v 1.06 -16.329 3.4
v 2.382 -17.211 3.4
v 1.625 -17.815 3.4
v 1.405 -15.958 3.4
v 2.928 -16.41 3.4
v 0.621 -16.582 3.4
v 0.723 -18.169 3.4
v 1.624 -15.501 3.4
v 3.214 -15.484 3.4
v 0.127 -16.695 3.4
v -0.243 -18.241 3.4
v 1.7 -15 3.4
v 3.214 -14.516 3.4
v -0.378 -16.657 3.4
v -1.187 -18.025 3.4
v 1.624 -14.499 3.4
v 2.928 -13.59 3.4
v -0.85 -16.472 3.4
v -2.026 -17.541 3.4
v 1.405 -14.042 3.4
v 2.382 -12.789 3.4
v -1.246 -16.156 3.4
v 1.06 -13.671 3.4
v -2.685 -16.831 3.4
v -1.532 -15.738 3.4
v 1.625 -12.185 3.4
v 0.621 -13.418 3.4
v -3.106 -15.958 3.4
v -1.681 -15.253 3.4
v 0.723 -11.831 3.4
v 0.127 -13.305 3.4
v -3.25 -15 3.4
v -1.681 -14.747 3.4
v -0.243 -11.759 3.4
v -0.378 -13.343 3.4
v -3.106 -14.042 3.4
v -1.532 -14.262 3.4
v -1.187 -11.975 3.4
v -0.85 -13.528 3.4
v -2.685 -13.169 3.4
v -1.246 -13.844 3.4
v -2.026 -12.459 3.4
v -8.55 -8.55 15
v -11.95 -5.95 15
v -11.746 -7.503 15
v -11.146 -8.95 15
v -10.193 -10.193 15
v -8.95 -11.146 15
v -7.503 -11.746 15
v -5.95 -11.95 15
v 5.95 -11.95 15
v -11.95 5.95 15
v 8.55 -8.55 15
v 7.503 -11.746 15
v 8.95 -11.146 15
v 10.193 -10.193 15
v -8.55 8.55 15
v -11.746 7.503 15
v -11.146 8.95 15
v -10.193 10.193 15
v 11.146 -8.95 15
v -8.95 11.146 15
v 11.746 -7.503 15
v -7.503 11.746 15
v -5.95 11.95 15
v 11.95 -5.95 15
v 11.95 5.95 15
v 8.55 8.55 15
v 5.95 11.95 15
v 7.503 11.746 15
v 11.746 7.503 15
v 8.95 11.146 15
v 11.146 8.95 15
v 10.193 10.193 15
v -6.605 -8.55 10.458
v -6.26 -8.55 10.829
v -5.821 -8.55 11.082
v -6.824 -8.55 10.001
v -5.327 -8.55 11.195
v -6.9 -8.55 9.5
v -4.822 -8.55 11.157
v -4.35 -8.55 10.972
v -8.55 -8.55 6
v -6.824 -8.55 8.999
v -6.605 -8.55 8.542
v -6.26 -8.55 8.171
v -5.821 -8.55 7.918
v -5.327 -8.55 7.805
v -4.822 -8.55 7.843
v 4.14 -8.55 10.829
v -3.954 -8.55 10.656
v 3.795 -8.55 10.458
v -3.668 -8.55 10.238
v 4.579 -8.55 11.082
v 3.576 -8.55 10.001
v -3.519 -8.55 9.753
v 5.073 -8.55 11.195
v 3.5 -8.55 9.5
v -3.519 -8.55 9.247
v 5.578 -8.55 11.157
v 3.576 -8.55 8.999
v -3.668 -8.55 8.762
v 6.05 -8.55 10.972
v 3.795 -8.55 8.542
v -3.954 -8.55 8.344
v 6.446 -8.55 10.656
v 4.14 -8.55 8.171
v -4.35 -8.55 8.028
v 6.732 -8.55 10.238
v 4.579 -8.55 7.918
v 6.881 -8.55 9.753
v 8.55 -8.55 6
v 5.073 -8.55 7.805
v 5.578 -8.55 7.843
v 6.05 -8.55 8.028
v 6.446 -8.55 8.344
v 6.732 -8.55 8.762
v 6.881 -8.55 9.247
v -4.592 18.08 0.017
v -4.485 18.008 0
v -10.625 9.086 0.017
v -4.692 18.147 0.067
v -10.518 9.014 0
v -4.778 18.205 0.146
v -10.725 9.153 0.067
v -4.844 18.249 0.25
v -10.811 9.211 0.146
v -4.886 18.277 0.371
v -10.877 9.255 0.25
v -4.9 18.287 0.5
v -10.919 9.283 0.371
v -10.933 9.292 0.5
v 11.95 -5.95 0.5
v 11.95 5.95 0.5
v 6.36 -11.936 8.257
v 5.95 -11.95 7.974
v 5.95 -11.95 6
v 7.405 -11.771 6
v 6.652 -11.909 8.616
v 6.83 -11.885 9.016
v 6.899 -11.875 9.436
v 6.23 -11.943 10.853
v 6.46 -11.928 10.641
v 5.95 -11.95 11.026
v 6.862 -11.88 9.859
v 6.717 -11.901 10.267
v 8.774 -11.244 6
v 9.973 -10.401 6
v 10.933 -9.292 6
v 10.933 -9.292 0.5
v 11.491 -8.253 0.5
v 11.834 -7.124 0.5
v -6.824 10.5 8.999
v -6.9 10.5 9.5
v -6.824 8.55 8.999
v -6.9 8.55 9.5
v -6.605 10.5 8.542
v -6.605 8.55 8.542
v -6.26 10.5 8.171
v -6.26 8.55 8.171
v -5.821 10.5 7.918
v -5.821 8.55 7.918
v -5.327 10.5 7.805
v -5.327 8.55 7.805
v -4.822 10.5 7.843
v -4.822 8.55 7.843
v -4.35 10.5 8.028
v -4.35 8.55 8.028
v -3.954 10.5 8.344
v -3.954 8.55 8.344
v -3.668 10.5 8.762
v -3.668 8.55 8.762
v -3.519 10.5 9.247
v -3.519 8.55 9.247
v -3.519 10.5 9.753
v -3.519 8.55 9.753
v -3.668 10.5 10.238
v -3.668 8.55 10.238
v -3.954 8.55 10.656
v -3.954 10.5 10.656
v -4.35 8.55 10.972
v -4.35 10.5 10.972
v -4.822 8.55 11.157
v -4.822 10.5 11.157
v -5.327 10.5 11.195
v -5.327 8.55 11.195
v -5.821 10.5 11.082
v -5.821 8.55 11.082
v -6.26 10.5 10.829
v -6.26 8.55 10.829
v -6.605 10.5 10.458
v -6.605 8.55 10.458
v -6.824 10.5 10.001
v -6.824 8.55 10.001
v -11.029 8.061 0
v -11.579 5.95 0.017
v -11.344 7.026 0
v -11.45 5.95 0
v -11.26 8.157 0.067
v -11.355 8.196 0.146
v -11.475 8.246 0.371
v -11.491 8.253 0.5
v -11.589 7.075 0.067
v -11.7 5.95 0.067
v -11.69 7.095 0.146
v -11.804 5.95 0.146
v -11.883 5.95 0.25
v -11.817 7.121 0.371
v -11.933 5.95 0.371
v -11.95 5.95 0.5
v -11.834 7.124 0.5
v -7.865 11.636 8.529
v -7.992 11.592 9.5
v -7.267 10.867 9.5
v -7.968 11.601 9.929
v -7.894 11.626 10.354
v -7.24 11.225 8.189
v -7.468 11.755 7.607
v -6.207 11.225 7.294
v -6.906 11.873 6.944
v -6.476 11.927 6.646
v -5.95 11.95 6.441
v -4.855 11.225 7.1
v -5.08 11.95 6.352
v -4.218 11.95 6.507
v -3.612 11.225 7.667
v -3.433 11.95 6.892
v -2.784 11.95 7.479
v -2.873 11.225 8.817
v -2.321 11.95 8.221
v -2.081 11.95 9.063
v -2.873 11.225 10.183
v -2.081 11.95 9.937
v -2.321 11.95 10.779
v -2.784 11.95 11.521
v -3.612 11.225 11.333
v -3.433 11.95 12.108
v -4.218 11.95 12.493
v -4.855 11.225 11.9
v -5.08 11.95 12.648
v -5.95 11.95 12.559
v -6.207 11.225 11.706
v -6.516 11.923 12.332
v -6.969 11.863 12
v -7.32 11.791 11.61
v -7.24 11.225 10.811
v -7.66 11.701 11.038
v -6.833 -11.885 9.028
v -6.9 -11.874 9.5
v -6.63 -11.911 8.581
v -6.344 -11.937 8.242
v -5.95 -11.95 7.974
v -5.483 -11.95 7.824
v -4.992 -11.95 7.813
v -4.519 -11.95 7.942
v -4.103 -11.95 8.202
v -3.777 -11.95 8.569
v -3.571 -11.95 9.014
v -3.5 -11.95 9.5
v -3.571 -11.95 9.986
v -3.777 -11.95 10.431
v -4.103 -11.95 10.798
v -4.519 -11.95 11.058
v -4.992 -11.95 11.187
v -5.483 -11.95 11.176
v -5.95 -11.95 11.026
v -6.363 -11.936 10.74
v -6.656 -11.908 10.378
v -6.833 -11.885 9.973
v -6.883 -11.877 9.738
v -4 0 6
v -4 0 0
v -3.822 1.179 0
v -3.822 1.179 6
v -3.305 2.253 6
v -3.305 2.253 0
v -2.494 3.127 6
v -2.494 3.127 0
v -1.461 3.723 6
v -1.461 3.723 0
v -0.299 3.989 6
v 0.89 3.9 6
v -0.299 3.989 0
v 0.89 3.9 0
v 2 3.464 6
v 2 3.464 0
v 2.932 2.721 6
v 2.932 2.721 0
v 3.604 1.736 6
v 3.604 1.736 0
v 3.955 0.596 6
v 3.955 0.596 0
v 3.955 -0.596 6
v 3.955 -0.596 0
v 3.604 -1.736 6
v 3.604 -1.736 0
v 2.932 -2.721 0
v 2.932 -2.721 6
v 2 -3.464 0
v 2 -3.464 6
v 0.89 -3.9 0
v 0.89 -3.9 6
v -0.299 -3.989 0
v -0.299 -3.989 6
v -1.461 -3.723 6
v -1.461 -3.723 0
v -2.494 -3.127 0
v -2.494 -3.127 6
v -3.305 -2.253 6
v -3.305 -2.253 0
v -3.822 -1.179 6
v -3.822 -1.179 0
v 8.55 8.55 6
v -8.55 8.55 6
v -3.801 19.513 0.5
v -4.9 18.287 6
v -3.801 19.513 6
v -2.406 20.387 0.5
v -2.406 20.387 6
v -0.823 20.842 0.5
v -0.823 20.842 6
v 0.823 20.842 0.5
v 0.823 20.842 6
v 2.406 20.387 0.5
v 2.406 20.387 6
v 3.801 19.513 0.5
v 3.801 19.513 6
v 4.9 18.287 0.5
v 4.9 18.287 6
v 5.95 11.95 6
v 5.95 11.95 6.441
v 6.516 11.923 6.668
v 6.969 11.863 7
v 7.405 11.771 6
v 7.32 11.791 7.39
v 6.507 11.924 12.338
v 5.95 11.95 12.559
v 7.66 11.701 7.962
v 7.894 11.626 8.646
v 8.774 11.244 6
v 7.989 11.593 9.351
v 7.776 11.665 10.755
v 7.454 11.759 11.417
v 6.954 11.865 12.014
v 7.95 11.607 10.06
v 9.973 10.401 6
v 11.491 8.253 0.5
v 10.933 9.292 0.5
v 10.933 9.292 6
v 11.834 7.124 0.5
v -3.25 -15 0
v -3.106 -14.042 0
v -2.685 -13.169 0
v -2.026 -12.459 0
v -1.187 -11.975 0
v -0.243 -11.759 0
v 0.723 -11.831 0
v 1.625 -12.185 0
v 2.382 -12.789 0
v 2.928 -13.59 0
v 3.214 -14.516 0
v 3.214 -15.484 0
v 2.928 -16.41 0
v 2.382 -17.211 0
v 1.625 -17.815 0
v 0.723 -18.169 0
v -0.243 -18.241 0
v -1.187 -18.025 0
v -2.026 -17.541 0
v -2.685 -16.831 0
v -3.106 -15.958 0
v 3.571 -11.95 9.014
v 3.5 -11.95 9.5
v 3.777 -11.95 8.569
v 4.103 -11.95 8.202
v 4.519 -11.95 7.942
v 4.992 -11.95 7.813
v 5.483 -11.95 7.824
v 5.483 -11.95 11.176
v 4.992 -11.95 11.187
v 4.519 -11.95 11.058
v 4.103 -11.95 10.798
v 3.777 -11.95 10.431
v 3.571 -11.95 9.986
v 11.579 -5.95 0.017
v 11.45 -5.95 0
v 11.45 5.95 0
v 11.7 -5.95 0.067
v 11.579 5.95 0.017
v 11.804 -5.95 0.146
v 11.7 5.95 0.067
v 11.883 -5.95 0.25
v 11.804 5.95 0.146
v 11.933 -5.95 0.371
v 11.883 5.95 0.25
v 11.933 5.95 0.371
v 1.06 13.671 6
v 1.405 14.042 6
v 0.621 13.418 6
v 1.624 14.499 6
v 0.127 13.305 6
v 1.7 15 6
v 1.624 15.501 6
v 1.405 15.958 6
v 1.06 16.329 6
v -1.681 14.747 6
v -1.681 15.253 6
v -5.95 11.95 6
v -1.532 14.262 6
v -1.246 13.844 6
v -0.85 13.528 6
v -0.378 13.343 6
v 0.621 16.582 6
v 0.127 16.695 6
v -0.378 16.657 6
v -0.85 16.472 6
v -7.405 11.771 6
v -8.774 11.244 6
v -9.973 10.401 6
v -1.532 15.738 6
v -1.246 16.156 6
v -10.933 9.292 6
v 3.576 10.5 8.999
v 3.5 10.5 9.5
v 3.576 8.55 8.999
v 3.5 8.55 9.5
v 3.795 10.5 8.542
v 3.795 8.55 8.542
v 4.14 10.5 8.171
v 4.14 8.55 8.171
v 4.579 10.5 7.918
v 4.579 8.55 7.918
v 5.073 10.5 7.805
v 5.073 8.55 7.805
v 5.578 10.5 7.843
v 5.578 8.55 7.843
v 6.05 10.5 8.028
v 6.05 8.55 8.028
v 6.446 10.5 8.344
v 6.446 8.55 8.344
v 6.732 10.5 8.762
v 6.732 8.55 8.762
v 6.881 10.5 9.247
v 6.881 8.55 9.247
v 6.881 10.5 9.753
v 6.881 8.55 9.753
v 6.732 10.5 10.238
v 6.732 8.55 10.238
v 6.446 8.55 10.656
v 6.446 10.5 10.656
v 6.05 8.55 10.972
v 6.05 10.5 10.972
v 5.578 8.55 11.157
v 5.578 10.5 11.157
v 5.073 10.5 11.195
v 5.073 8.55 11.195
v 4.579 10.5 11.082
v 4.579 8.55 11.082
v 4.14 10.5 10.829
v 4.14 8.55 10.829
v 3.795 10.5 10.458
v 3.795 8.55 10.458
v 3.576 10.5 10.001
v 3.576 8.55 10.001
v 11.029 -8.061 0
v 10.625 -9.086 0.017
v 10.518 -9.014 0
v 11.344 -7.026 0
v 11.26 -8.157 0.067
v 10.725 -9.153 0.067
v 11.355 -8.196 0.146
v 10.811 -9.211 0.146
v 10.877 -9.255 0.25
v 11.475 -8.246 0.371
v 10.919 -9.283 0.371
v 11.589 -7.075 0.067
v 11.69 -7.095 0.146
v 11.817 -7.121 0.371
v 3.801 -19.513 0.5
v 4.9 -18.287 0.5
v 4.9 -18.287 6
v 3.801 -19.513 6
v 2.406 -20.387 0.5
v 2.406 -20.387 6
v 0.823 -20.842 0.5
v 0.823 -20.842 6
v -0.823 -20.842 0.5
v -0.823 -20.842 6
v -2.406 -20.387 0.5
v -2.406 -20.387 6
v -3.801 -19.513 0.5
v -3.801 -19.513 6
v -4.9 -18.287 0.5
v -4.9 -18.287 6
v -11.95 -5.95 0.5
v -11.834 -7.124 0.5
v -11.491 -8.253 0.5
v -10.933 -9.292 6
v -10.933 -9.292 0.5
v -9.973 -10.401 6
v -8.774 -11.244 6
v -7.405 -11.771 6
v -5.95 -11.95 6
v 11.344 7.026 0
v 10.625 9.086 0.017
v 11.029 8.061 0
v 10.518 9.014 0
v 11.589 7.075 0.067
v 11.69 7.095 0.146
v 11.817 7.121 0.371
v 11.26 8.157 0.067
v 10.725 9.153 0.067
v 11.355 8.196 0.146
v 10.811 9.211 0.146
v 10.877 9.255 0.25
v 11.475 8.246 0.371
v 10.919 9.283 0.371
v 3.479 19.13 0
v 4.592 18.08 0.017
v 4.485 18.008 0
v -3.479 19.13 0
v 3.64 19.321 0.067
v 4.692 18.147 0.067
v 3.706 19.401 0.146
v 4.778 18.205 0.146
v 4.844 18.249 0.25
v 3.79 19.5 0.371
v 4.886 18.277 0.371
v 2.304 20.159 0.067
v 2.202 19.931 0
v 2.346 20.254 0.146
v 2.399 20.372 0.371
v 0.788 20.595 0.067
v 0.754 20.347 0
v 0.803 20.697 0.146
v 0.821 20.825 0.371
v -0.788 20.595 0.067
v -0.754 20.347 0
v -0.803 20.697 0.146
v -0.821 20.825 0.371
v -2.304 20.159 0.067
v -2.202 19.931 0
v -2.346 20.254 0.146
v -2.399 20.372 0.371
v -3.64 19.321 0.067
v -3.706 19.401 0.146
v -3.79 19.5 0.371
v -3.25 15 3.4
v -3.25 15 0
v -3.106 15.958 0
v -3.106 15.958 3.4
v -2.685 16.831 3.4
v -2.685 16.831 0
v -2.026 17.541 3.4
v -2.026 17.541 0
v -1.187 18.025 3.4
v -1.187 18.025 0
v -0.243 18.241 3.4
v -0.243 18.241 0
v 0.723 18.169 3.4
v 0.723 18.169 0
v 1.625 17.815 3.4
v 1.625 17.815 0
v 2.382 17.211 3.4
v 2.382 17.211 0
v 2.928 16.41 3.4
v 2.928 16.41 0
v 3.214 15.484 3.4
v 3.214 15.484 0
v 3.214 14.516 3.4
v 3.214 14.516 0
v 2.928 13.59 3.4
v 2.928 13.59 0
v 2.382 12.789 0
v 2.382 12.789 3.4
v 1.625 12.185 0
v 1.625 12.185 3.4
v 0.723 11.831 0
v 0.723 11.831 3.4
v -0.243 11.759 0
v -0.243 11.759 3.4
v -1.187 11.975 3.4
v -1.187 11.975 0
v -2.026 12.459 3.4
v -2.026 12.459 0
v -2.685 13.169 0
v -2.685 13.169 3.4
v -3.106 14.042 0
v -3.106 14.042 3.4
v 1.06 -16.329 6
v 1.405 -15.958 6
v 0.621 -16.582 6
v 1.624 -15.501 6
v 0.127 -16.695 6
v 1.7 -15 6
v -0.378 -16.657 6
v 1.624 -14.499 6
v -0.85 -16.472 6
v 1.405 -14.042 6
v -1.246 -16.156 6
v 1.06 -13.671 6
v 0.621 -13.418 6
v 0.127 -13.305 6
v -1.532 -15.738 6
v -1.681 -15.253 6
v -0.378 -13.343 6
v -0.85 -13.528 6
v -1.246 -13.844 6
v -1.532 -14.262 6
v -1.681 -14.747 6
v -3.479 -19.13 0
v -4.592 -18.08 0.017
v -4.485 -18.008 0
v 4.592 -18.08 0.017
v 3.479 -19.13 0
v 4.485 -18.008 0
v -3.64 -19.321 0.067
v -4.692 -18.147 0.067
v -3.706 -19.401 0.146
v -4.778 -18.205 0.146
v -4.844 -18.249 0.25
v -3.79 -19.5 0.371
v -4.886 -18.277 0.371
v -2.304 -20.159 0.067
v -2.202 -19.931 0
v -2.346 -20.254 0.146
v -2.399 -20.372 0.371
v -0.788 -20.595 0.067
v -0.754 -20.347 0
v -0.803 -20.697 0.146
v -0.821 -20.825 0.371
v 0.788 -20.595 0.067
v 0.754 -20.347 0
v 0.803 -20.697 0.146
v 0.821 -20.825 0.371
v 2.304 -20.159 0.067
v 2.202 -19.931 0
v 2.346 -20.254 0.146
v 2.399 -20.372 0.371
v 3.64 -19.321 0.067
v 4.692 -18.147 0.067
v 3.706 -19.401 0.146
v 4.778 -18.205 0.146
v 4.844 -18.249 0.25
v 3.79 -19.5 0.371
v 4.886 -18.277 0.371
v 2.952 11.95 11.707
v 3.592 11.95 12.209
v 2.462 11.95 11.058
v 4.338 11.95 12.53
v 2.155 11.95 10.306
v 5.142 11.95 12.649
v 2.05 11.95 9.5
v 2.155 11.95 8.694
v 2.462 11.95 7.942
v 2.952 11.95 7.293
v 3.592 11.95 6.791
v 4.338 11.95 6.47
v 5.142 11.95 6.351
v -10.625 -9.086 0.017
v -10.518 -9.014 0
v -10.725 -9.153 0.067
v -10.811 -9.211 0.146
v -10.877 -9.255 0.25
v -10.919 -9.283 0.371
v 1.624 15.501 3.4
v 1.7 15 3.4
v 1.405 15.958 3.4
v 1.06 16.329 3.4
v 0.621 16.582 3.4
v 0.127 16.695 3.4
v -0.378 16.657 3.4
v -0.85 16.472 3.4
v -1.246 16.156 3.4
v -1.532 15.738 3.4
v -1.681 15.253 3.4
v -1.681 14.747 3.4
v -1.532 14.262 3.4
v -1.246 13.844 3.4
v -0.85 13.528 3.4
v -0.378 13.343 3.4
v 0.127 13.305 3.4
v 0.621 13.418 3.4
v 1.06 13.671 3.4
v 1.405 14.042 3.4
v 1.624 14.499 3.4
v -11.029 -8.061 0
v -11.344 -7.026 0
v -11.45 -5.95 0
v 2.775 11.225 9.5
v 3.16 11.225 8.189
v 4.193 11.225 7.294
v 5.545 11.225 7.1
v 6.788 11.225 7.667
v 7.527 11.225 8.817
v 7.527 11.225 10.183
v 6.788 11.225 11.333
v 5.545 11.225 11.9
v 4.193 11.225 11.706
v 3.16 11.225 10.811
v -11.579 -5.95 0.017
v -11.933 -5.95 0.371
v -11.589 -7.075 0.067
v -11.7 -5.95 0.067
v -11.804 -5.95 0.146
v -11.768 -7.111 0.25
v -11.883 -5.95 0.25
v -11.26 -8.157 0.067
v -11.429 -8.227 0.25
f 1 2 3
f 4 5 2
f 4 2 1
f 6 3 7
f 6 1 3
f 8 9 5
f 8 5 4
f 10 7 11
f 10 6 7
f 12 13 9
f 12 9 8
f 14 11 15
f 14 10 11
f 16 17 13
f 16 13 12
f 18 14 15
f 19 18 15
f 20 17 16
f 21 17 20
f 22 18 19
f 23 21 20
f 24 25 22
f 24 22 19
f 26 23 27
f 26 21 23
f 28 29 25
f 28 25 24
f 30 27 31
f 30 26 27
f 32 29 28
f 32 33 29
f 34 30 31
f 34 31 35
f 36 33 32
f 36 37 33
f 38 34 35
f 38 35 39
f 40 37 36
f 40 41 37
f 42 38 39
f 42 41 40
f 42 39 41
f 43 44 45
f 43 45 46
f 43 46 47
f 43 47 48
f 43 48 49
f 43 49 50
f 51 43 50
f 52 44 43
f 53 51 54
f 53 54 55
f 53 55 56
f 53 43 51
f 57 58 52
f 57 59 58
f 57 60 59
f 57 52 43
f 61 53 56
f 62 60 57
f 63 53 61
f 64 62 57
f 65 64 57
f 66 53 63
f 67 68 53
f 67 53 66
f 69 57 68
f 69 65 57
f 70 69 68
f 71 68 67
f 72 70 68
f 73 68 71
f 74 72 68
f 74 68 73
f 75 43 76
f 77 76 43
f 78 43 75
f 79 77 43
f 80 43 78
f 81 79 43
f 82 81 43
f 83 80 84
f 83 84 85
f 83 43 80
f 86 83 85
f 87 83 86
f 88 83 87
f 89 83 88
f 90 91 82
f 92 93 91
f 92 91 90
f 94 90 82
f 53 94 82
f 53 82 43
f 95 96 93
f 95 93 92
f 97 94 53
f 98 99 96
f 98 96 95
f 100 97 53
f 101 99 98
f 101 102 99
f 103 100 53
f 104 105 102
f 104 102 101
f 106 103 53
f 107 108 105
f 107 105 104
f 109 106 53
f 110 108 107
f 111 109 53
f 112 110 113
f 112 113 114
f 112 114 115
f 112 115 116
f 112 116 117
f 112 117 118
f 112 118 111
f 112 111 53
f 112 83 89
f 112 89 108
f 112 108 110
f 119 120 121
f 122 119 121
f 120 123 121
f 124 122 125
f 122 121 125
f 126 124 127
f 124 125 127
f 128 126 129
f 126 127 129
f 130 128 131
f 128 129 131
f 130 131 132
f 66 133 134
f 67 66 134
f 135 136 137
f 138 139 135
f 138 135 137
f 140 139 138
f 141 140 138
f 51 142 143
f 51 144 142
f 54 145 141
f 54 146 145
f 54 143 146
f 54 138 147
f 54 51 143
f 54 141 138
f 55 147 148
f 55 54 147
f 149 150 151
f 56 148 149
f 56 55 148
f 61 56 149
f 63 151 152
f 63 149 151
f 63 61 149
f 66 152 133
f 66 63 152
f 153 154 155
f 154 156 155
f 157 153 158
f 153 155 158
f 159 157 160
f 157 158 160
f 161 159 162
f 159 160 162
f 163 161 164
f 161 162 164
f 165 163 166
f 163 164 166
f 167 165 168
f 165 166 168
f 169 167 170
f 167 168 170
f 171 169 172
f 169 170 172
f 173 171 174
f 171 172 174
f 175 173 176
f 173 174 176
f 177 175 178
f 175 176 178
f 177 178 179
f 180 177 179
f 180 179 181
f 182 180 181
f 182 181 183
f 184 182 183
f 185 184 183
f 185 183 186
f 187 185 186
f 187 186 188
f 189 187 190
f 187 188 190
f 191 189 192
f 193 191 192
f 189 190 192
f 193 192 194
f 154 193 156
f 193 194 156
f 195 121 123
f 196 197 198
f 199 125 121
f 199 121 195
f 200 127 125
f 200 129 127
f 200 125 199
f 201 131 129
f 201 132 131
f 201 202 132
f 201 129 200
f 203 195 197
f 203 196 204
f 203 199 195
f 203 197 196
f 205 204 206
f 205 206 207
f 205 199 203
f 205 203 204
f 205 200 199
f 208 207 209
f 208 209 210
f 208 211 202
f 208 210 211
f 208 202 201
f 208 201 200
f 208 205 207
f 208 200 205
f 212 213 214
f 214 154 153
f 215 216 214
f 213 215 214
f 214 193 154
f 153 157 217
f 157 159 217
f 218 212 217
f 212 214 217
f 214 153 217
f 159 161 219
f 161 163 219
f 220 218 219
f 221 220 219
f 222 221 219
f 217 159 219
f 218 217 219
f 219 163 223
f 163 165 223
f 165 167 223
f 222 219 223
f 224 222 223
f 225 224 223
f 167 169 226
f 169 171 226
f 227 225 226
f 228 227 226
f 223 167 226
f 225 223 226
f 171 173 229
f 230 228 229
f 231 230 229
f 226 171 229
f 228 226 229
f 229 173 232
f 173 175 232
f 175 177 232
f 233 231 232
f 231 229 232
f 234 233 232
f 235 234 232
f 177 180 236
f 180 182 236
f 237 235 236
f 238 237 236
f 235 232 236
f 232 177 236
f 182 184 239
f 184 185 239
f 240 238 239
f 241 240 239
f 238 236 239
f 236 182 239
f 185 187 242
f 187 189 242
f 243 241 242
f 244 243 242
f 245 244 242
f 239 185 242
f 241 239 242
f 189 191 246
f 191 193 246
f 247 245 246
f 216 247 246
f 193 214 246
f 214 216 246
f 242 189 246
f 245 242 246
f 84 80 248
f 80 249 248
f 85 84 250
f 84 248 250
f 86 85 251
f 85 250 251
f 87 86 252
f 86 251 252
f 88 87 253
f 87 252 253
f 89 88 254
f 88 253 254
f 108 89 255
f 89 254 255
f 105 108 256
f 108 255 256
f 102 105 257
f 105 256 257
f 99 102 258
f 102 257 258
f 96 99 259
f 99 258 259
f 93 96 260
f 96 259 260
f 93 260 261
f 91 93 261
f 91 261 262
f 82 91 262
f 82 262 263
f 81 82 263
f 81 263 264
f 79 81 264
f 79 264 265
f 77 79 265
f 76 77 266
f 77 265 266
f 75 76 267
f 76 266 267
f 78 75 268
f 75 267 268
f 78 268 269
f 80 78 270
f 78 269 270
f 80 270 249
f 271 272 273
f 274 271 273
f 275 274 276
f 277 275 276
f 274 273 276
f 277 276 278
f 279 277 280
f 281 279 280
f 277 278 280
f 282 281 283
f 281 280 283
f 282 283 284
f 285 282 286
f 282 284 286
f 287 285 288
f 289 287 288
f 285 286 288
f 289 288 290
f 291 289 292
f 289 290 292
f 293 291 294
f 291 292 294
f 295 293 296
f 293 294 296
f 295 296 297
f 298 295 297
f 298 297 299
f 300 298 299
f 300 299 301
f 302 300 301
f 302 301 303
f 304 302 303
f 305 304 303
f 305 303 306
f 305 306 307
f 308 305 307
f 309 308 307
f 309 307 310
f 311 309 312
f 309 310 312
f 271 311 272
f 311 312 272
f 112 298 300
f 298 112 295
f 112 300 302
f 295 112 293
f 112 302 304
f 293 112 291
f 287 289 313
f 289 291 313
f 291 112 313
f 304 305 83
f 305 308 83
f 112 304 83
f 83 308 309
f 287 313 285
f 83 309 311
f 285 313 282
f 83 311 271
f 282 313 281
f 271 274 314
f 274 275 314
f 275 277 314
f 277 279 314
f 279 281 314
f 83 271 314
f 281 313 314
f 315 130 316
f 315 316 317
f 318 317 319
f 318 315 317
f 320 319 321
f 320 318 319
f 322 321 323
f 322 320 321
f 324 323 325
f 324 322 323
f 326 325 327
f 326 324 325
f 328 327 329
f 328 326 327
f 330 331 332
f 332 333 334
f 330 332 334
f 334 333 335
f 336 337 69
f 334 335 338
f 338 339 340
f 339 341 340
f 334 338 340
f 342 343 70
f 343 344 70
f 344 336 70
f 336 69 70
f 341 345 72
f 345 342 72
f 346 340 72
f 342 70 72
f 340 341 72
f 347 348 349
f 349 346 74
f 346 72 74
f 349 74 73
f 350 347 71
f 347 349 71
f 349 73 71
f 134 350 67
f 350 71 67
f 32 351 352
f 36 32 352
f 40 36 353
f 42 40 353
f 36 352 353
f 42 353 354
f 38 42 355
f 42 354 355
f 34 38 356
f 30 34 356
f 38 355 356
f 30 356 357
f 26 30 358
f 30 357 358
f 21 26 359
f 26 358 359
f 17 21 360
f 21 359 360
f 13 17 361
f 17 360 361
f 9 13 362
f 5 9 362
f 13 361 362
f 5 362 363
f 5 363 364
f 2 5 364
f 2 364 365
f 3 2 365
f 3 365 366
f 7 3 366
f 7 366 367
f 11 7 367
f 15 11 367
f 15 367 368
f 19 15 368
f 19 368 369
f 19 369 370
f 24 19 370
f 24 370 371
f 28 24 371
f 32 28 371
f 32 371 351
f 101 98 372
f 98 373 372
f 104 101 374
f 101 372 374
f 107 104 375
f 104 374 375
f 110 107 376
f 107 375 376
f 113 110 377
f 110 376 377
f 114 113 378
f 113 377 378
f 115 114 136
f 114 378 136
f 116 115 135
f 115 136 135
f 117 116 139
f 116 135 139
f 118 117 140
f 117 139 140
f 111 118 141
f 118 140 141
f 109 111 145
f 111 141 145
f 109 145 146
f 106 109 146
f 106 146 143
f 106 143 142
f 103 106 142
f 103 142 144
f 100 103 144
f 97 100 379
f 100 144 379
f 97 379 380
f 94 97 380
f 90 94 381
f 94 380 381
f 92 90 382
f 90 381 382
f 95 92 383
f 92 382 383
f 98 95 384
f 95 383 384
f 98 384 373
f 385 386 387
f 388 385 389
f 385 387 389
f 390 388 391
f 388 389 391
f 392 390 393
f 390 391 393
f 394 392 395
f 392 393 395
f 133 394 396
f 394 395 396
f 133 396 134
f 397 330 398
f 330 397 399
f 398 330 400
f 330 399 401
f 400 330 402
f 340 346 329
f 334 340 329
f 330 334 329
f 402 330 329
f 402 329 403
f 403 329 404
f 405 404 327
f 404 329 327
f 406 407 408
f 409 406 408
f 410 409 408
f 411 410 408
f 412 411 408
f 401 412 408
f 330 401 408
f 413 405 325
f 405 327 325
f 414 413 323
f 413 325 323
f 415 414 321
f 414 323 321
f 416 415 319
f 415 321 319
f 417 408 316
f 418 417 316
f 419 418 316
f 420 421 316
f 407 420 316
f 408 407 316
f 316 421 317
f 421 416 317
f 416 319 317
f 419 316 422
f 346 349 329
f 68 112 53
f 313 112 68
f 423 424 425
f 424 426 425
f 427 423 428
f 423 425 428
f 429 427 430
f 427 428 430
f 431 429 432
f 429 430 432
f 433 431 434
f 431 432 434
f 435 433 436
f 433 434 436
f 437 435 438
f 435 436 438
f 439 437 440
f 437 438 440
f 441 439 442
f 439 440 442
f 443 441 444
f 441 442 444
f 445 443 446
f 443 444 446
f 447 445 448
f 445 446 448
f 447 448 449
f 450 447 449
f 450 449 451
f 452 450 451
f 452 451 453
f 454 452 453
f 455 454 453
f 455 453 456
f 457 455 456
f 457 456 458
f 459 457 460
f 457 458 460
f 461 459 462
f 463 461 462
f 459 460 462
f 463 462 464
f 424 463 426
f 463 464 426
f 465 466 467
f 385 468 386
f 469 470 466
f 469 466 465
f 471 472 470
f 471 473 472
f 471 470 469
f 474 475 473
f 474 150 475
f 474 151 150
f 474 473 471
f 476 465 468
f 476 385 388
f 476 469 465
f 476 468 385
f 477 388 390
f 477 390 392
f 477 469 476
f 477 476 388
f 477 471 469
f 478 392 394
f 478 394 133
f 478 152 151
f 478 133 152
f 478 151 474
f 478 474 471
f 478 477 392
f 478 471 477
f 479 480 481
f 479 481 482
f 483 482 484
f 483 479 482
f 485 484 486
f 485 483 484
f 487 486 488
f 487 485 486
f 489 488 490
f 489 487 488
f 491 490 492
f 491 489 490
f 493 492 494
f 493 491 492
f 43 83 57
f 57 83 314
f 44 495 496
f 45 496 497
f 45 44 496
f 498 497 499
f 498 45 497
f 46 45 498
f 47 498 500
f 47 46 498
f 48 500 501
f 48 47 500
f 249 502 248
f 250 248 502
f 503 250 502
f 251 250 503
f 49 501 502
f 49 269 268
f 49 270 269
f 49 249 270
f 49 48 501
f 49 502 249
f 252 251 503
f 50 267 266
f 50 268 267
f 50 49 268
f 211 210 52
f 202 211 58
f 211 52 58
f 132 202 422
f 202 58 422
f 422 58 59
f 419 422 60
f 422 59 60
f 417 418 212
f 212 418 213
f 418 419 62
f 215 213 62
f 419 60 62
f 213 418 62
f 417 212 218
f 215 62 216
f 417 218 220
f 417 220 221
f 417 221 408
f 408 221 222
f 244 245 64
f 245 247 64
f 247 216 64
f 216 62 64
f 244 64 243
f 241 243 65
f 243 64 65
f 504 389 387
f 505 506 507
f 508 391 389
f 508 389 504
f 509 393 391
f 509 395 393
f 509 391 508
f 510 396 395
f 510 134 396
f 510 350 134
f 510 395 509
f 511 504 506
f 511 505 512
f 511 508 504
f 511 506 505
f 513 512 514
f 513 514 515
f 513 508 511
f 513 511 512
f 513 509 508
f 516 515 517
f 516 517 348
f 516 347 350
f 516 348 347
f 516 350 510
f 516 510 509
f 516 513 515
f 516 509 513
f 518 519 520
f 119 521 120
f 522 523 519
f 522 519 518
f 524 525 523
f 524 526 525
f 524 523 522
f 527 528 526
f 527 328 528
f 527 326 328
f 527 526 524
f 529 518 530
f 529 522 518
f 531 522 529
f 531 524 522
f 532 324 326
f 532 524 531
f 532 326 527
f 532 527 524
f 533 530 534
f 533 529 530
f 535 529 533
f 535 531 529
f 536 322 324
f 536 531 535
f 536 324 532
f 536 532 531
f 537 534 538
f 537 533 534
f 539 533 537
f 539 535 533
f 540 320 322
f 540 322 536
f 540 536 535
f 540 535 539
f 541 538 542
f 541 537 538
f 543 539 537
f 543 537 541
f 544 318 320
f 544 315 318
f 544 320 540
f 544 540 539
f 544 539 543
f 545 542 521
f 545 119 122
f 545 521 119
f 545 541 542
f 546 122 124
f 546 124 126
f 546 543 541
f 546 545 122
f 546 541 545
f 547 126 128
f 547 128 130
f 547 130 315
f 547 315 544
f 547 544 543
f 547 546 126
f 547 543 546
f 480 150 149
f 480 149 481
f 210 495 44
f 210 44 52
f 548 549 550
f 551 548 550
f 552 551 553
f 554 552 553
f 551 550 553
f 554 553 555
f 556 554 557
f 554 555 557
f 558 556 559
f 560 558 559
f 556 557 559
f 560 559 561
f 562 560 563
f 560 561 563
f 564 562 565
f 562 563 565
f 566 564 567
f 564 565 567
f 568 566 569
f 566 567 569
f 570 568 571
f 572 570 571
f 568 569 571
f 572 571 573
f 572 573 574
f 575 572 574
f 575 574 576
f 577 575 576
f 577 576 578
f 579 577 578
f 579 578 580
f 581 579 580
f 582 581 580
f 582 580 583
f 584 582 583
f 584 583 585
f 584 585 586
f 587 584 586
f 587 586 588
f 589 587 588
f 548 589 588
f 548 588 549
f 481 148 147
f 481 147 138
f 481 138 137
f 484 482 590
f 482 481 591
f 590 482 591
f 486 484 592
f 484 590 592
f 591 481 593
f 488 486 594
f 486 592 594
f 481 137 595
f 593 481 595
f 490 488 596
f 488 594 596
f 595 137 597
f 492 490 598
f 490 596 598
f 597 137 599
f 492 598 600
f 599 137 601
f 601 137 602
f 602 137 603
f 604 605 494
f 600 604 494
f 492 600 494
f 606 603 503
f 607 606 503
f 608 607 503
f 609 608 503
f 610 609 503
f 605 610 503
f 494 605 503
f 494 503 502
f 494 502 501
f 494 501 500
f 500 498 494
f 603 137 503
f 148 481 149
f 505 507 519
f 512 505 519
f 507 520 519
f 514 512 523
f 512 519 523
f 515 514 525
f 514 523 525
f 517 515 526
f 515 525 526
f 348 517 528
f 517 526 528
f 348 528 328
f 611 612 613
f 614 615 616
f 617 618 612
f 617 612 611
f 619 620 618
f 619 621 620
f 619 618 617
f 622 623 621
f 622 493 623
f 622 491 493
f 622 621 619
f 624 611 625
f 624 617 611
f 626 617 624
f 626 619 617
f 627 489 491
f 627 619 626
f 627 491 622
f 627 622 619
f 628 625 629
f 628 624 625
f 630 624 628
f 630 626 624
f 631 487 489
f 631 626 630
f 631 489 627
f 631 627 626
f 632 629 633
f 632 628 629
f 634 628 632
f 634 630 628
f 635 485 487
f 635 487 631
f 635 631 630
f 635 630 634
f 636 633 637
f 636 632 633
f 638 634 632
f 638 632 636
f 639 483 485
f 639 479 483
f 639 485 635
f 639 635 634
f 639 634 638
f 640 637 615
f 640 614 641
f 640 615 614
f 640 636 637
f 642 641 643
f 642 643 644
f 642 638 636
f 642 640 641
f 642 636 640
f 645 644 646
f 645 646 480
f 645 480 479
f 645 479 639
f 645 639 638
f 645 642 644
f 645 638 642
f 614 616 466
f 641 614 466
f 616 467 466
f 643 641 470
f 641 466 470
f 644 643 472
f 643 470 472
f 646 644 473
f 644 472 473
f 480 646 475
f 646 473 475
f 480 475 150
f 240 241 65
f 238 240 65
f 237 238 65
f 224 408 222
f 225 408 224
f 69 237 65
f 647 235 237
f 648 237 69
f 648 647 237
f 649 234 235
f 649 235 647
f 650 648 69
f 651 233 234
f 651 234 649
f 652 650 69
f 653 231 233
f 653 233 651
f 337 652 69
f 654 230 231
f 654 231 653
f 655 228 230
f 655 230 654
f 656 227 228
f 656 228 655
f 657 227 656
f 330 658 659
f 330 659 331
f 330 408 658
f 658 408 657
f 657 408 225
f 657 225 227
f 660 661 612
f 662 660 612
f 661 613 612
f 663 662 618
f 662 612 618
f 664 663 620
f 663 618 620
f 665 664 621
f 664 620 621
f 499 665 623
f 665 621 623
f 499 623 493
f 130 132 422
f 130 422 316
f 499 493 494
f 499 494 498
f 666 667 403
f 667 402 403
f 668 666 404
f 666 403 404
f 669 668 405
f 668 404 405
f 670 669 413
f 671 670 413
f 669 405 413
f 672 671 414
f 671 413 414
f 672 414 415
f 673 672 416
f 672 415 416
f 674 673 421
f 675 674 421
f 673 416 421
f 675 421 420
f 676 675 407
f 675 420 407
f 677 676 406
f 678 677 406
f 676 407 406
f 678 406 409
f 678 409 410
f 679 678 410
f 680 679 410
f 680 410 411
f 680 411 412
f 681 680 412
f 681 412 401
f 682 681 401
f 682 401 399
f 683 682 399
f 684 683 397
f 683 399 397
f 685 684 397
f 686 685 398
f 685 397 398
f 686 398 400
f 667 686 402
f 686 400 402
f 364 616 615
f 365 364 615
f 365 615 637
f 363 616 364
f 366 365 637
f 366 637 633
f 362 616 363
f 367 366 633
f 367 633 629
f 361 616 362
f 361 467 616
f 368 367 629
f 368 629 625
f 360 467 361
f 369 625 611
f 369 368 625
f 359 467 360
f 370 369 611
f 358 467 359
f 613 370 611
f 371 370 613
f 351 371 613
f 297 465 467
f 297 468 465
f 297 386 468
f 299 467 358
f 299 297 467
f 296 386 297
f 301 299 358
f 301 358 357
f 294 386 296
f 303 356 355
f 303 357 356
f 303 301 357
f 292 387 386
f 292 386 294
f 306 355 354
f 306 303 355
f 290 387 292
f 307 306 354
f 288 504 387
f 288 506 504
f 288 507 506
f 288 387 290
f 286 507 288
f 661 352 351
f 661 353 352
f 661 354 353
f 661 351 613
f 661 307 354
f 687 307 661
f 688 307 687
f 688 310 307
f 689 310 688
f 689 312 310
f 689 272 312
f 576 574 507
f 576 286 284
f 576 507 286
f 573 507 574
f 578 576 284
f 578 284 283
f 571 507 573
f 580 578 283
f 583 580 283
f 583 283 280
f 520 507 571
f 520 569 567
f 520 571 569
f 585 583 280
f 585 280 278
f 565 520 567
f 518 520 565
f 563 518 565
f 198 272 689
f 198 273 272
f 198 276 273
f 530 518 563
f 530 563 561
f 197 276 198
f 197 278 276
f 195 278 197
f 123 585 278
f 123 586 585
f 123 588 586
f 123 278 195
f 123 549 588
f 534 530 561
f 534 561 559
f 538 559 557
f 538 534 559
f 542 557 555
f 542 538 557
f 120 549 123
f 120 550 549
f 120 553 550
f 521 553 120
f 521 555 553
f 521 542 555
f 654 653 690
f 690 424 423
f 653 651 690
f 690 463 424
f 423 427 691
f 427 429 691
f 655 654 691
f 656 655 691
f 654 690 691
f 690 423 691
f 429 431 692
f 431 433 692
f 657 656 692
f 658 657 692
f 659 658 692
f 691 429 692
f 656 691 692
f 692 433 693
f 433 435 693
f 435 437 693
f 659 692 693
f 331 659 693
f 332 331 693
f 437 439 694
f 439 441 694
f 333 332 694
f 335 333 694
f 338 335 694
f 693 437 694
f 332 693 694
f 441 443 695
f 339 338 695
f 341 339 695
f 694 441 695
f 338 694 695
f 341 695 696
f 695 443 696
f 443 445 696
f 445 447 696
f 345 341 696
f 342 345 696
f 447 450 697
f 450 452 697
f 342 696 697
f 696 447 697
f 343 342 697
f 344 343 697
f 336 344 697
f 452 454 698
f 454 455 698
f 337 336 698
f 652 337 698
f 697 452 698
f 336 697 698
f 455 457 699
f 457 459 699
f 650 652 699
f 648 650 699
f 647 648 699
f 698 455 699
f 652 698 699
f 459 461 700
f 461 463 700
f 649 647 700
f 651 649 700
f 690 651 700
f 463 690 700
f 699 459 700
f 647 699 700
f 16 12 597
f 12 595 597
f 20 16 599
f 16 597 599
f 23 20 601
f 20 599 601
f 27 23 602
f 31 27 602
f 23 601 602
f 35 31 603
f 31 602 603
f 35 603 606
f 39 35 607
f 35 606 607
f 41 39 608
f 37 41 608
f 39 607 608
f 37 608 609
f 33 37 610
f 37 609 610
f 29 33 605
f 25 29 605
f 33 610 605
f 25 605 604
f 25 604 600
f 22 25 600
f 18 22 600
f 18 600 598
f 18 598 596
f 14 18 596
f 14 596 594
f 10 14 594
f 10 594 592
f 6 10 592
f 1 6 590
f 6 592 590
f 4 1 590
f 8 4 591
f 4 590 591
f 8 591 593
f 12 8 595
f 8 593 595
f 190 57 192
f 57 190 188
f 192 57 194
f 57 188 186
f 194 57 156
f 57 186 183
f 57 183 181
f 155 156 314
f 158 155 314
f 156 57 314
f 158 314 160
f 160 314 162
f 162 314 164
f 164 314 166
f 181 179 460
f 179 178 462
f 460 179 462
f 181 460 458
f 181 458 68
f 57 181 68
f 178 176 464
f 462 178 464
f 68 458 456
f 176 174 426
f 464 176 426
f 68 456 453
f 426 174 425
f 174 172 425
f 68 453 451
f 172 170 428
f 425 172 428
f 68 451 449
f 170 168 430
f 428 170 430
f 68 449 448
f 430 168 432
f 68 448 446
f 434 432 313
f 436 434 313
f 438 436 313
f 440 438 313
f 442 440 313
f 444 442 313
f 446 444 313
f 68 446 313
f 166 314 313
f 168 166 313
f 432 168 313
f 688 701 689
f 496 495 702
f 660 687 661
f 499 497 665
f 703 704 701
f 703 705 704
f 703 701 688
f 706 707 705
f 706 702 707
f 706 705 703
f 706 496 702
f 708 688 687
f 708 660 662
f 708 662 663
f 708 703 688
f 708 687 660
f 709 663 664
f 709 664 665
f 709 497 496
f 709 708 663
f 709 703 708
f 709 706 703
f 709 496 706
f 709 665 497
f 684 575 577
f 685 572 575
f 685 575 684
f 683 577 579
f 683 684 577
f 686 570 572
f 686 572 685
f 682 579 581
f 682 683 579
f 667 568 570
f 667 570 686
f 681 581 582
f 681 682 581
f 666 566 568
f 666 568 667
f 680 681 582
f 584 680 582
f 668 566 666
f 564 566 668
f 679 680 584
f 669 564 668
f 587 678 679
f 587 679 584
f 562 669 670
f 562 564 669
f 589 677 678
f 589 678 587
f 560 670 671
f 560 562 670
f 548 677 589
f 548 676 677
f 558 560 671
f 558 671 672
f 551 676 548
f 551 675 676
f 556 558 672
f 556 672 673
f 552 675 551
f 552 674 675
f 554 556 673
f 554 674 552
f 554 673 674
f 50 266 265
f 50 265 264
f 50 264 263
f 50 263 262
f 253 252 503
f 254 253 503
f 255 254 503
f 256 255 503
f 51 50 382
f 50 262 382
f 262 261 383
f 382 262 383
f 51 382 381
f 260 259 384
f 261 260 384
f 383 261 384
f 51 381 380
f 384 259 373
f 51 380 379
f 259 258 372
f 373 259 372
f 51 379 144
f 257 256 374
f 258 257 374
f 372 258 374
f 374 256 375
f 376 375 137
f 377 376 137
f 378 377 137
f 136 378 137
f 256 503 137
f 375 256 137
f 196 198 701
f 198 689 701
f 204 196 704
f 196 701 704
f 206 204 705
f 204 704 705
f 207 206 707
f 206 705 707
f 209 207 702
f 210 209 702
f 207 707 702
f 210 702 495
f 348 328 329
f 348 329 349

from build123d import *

# Parameters (mm, degrees)
SKETCH1_W                                           = 23.9
SKETCH1_H                                           = 23.9
SKETCH1_W_2                                         = 17.1
SKETCH1_H_2                                         = 17.1
BOSS_EXTRUDE1_DEPTH                                 = 15
FILLET1_R                                           = 6
SKETCH3_R                                           = 4
BOSS_EXTRUDE2_DEPTH                                 = 6
BOSS_EXTRUDE3_DEPTH                                 = 6
CBORE_FOR_M3_HEX_SOCKET_HEAD_CAP_SCREW1_D           = 3.4
CBORE_FOR_M3_HEX_SOCKET_HEAD_CAP_SCREW1_CBORE_D     = 6.5
CBORE_FOR_M3_HEX_SOCKET_HEAD_CAP_SCREW1_CBORE_DEPTH = 3.4
FILLET2_R                                           = 0.5
CSK_FOR_M3_COUNTERSUNK_FLAT_HEAD_SCREW1_D           = 3.4
CSK_FOR_M3_COUNTERSUNK_FLAT_HEAD_SCREW1_CSINK_D     = 6.3
CSK_FOR_M3_COUNTERSUNK_FLAT_HEAD_SCREW1_CSINK_ANGLE = 90


with BuildPart() as part:
    # Sketch1 → Boss-Extrude1 (new body)
    with BuildSketch(Plane.XY):
        Rectangle(SKETCH1_W, SKETCH1_H)
        Rectangle(SKETCH1_W_2, SKETCH1_H_2, mode=Mode.SUBTRACT)
    extrude(amount=BOSS_EXTRUDE1_DEPTH)

    # Fillet1
    fillet1_edges = [part.edges().sort_by_distance(p)[0] for p in [
        (11.95, -11.95, 7.5),
        (-11.95, -11.95, 7.5),
        (-11.95, 11.95, 7.5),
        (11.95, 11.95, 7.5),
    ]]
    fillet(fillet1_edges, radius=FILLET1_R)

    # Sketch3 → Boss-Extrude2 (add)
    with BuildSketch(Plane(origin=(0, 0, 0), x_dir=(-1, 0, 0), z_dir=(0, 0, -1))):
        with BuildLine():
            Line((-5.95, -11.95), (5.95, -11.95))
            ThreePointArc((5.95, -11.95), (10.192640687, -10.192640687), (11.95, -5.95))
            Line((11.95, -5.95), (11.95, 5.95))
            ThreePointArc((11.95, 5.95), (10.192640687, 10.192640687), (5.95, 11.95))
            Line((5.95, 11.95), (-5.95, 11.95))
            ThreePointArc((-5.95, 11.95), (-10.192640687, 10.192640687), (-11.95, 5.95))
            Line((-11.95, 5.95), (-11.95, -5.95))
            ThreePointArc((-11.95, -5.95), (-10.192640687, -10.192640687), (-5.95, -11.95))
        make_face()
        Circle(SKETCH3_R, mode=Mode.SUBTRACT)
    extrude(amount=-BOSS_EXTRUDE2_DEPTH)

    # Sketch2 → Boss-Extrude3 (add)
    with BuildSketch(Plane(origin=(0, 0, 0), x_dir=(-1, 0, 0), z_dir=(0, 0, -1))):
        with BuildLine():
            Line((-5.95, 11.95), (5.95, 11.95))
            ThreePointArc((5.95, 11.95), (8.773656269, 11.244049988), (10.932859145, 9.292321759))
            Line((10.932859145, 9.292321759), (4.899811493, 18.286616396))
            ThreePointArc((4.899811493, 18.286616396), (0, 20.9), (-4.899811493, 18.286616396))
            Line((-4.899811493, 18.286616396), (-10.932859145, 9.292321759))
            ThreePointArc((-10.932859145, 9.292321759), (-8.773656269, 11.244049988), (-5.95, 11.95))
        make_face()
        with BuildLine():
            Line((4.899811493, -18.286616396), (10.932859145, -9.292321759))
            ThreePointArc((10.932859145, -9.292321759), (8.773656269, -11.244049988), (5.95, -11.95))
            Line((5.95, -11.95), (-5.95, -11.95))
            ThreePointArc((-5.95, -11.95), (-8.773656269, -11.244049988), (-10.932859145, -9.292321759))
            Line((-10.932859145, -9.292321759), (-4.899811493, -18.286616396))
            ThreePointArc((-4.899811493, -18.286616396), (0, -20.9), (4.899811493, -18.286616396))
        make_face()
    extrude(amount=-BOSS_EXTRUDE3_DEPTH)

    # CBORE for M3 Hex Socket Head Cap Screw1 (through all)
    with Locations(Plane(origin=(0, 0, 0), x_dir=(-1, 0, 0), z_dir=(0, 0, -1))):
        with Locations((0, 15), (0, -15)):
            CounterBoreHole(CBORE_FOR_M3_HEX_SOCKET_HEAD_CAP_SCREW1_D / 2, CBORE_FOR_M3_HEX_SOCKET_HEAD_CAP_SCREW1_CBORE_D / 2, CBORE_FOR_M3_HEX_SOCKET_HEAD_CAP_SCREW1_CBORE_DEPTH)

    # Fillet2
    fillet2_edges = [part.edges().sort_by_distance(p)[0] for p in [
        (-11.690085142, -7.696832151, 0),
        (0, -20.9, 0),
        (7.916335319, -13.789469077, 0),
        (-7.916335319, -13.789469077, 0),
        (11.95, 0, 0),
        (-11.95, 0, 0),
        (-11.690085142, 7.696832151, 0),
        (11.690085142, -7.696832151, 0),
        (11.690085142, 7.696832151, 0),
        (-7.916335319, 13.789469077, 0),
        (0, 20.9, 0),
        (7.916335319, 13.789469077, 0),
    ]]
    fillet(fillet2_edges, radius=FILLET2_R)

    # CSK for M3 Countersunk Flat Head Screw1 (through all)
    with Locations(Plane(origin=(0, 11.95, 0), x_dir=(1, 0, 0), z_dir=(0, 1, 0))):
        with Locations((-5.2, -9.5), (5.2, -9.5)):
            CounterSinkHole(CSK_FOR_M3_COUNTERSUNK_FLAT_HEAD_SCREW1_D / 2, CSK_FOR_M3_COUNTERSUNK_FLAT_HEAD_SCREW1_CSINK_D / 2, counter_sink_angle=CSK_FOR_M3_COUNTERSUNK_FLAT_HEAD_SCREW1_CSINK_ANGLE)


solid = part.part
